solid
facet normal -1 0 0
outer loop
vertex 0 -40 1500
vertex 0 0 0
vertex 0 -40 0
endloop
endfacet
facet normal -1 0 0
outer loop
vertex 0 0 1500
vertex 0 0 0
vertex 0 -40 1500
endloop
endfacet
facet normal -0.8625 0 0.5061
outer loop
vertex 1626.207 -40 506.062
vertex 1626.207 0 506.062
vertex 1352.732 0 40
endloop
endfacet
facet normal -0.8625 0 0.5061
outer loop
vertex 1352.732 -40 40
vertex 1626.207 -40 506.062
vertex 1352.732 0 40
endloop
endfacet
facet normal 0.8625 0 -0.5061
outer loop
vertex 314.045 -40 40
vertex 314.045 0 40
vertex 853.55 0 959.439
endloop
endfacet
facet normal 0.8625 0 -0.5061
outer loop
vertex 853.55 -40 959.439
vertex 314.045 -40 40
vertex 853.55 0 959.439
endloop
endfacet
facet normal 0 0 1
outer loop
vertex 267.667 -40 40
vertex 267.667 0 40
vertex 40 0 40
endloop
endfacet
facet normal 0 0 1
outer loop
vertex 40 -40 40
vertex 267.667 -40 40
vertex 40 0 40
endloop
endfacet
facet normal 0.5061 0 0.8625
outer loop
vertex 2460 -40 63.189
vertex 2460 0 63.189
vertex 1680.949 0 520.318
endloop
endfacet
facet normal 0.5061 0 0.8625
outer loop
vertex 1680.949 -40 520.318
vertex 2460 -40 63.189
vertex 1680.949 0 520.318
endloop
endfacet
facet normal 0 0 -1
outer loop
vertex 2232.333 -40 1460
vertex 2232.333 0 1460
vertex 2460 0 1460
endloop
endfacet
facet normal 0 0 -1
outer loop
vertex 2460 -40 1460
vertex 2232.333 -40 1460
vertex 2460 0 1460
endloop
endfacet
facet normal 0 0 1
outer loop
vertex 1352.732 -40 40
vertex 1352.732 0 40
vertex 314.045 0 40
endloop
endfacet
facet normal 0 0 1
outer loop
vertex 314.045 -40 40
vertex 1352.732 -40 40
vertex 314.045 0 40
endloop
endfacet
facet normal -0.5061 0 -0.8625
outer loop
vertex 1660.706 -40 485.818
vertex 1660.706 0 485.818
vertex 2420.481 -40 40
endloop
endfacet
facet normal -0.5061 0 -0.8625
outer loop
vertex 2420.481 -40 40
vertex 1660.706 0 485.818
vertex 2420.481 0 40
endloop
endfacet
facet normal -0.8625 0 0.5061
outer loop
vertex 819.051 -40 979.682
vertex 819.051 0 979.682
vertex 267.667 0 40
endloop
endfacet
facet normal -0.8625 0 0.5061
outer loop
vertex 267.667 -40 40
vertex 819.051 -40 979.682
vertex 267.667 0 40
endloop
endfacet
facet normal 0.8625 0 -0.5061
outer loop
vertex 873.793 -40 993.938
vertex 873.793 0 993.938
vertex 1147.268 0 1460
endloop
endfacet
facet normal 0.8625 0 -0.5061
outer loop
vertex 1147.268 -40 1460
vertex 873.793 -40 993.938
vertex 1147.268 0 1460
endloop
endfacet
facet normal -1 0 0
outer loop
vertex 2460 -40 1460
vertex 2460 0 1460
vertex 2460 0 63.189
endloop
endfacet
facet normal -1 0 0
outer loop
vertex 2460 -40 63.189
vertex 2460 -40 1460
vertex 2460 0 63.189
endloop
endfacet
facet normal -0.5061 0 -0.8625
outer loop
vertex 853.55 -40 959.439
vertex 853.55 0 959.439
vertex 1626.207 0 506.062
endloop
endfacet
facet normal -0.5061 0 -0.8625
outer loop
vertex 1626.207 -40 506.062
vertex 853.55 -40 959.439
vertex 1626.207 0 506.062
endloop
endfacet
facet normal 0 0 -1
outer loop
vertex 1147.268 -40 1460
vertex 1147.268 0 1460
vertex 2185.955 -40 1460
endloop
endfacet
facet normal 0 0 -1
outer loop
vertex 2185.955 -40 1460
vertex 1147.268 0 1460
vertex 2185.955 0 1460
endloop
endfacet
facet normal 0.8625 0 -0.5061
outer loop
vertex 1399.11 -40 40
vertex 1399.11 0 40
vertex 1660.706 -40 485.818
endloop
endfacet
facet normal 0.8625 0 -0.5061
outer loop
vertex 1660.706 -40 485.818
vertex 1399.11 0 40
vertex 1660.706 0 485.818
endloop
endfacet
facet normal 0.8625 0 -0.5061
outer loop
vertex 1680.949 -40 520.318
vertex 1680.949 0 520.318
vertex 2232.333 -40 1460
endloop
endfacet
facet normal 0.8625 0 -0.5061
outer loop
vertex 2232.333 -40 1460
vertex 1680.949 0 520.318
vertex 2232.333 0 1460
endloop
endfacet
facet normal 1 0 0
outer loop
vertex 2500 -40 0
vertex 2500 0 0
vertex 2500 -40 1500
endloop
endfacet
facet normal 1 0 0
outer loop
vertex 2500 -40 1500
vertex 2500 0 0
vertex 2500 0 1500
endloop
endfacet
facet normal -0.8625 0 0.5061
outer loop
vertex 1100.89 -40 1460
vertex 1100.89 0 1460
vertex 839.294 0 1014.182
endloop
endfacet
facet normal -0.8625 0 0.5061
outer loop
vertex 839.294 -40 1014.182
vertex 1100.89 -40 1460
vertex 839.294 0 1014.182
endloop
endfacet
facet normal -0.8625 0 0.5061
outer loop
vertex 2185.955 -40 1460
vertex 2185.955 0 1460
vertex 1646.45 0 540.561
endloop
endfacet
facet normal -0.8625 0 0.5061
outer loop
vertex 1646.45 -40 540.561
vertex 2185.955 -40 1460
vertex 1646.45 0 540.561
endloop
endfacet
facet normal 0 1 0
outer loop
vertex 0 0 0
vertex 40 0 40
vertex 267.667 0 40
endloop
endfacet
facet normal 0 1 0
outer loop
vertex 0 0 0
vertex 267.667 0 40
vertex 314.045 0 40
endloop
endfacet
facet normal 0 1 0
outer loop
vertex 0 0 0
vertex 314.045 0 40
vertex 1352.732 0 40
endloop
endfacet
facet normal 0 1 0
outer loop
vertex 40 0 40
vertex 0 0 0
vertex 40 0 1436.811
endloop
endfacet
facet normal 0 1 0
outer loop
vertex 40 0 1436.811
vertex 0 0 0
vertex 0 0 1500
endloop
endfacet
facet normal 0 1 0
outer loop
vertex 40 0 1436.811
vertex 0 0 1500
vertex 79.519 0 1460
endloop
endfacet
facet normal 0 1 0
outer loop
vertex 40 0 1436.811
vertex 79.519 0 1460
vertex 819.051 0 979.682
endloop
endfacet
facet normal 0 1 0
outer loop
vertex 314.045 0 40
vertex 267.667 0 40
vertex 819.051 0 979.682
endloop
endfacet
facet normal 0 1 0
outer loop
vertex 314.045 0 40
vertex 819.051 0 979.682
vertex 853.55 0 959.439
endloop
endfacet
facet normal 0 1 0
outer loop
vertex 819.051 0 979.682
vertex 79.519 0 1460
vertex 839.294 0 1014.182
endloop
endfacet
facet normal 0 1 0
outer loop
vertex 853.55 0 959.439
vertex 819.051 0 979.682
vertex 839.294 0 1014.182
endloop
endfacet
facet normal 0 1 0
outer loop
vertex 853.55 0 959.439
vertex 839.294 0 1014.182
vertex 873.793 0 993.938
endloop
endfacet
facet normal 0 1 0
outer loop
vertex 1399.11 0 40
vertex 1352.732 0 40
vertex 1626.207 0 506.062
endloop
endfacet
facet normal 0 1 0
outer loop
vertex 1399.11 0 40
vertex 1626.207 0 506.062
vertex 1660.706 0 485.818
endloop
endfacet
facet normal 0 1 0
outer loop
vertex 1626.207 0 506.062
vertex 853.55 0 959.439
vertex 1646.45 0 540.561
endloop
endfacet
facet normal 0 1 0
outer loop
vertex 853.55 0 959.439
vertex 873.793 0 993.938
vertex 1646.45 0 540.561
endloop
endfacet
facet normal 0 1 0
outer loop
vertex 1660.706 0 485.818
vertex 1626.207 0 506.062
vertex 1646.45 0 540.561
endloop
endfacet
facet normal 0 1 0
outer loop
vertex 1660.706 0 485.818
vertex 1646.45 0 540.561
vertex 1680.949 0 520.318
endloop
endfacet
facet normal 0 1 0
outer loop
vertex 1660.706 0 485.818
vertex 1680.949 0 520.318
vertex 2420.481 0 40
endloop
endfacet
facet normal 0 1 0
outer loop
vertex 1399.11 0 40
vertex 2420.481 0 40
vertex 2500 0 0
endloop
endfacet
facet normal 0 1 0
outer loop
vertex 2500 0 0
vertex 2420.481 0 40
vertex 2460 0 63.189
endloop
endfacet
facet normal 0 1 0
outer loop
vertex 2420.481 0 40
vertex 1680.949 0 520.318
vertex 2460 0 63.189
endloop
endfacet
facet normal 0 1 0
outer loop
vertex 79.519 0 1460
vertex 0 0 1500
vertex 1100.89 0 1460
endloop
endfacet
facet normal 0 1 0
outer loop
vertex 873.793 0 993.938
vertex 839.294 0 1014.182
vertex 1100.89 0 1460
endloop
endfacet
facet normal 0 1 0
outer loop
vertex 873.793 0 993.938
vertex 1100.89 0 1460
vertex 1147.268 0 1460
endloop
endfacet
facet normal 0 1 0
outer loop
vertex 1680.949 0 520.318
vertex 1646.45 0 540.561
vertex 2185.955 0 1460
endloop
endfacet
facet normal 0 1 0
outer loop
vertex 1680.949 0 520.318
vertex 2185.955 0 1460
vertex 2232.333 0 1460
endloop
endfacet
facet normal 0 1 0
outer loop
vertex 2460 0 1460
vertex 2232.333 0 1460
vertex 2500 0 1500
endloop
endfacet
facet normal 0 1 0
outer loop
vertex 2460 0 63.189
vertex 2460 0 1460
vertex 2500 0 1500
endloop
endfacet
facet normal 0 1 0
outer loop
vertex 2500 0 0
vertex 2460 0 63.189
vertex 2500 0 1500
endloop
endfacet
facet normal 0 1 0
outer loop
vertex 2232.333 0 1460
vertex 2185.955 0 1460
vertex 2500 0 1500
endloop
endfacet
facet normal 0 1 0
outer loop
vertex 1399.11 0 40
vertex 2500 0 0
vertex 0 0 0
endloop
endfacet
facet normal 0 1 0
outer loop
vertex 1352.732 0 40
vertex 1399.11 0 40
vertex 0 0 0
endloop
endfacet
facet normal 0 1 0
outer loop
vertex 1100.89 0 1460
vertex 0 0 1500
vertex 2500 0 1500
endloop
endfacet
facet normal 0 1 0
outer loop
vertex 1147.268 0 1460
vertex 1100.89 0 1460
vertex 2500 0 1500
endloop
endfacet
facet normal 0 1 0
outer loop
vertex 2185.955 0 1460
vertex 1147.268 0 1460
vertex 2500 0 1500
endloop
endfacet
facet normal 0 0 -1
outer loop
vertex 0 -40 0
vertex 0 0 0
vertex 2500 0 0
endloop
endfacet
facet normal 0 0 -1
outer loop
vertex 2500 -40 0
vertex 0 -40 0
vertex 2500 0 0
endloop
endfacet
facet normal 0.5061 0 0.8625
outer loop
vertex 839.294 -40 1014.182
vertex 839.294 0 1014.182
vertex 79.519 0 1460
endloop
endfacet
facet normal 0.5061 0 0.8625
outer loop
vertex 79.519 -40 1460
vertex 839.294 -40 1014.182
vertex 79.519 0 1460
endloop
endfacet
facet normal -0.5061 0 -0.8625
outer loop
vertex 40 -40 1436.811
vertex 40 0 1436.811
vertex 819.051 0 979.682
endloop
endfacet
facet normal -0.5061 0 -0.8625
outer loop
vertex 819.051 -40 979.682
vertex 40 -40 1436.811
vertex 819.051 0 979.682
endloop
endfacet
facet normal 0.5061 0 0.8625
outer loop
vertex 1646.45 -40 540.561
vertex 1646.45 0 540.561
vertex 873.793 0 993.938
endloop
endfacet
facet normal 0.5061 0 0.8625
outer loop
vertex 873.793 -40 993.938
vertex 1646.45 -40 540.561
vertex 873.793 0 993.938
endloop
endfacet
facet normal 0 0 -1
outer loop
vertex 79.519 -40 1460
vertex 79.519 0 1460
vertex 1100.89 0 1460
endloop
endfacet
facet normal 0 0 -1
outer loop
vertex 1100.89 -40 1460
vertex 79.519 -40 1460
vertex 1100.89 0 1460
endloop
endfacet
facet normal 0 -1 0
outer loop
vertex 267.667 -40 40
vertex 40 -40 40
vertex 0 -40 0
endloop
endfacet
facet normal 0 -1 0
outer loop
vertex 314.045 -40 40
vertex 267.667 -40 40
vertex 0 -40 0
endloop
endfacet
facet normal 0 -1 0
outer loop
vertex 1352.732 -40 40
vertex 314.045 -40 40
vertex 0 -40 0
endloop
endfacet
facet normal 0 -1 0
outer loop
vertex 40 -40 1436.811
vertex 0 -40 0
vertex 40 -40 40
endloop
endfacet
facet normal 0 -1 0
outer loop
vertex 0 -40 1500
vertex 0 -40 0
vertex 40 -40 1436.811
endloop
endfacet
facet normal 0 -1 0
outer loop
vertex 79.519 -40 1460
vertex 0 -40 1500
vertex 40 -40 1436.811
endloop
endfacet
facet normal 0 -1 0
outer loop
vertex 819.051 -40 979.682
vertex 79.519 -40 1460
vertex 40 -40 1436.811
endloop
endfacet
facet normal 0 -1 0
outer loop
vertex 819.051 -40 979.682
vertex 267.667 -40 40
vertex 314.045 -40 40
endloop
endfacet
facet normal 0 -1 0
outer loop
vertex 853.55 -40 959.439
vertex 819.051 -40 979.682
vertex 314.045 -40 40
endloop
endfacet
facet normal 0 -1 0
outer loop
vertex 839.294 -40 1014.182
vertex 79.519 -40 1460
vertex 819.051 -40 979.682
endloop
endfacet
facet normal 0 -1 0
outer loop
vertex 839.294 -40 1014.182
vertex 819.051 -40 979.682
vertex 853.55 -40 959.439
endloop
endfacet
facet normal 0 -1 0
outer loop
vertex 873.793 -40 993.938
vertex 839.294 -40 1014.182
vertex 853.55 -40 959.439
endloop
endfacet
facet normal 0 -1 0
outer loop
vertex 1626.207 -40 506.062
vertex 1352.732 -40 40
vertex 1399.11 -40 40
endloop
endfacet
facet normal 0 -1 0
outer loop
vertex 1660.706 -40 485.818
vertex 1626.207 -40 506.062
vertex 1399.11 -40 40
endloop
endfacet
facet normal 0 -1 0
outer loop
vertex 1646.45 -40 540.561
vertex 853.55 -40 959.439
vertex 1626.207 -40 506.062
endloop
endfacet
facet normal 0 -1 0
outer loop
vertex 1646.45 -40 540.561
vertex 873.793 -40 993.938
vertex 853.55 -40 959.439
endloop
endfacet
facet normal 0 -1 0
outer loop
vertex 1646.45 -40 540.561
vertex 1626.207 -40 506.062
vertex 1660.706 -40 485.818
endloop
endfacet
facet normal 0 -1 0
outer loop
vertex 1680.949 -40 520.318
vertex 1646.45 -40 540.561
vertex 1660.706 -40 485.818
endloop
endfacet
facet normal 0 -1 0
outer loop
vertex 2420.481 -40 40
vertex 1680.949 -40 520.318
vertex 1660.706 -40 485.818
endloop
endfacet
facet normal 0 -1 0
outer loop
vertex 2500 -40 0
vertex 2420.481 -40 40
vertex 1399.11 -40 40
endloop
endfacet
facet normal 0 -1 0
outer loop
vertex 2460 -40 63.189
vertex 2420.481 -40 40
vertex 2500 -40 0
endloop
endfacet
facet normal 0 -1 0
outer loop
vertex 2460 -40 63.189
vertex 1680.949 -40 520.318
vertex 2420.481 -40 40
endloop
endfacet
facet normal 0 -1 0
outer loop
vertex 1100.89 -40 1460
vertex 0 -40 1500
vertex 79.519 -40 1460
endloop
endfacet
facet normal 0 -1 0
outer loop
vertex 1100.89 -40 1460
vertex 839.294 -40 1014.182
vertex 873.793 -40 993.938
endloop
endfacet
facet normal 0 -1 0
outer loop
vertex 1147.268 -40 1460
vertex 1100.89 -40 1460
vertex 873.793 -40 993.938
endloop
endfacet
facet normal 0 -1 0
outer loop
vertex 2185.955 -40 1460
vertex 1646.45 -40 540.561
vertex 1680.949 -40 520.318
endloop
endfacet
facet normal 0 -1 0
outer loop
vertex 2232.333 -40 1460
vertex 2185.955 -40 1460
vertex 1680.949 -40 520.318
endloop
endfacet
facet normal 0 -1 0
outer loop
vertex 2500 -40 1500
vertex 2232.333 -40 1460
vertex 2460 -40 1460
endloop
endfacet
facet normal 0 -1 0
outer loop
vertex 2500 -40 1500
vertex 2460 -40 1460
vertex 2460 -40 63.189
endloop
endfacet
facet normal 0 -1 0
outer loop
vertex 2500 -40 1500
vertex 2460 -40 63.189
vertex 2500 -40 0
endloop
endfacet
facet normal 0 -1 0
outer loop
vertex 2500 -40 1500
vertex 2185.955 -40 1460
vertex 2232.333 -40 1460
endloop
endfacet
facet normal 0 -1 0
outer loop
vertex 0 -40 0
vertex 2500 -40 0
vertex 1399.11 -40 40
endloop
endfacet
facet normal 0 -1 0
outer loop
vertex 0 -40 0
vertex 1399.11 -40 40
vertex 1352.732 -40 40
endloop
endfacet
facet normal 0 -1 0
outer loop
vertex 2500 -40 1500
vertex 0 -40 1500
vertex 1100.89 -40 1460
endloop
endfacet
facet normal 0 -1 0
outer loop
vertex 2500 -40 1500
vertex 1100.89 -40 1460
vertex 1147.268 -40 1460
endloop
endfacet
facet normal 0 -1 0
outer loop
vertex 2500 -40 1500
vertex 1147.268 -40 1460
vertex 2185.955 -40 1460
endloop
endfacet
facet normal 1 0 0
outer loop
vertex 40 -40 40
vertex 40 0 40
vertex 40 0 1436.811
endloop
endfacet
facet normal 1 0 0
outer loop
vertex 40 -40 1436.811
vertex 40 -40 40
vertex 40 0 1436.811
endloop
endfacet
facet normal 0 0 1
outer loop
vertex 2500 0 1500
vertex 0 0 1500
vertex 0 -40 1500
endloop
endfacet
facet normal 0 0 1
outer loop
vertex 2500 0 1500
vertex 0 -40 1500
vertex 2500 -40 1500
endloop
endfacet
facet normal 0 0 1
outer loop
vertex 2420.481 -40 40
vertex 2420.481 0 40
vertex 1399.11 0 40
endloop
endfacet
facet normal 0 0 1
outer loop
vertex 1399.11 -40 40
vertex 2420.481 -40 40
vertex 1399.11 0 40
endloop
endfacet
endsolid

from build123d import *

# Parameters (mm, degrees)
F0_W     = 2500
F0_H     = 1500
F1_DEPTH = 40


with BuildPart() as f1:
    # F0 (on Front) → F1 (new body)
    with BuildSketch(Plane.XZ):
        with Locations((1250, 750)):
            Rectangle(F0_W, F0_H)
        Polygon((40, 1436.8111485162), (40, 1460), (79.5190285851, 1460), (1100.8899553859, 1460), (1147.2676583536, 1460), (2185.9554821423, 1460), (2232.33318511, 1460), (2460, 1460), (2460, 63.1888514838), (2460, 40), (2420.4809714149, 40), (1399.1100446141, 40), (1352.7323416464, 40), (314.0445178577, 40), (267.66681489, 40), (40, 40), align=None, mode=Mode.SUBTRACT)
        Polygon((853.5499625474, 959.4388564429), (819.0506256329, 979.6822690125), (267.66681489, 40), (314.0445178577, 40), align=None)
        Polygon((79.5190285851, 1460), (40, 1460), (40, 1436.8111485162), (819.0506256329, 979.6822690125), (839.2940382026, 1014.181605927), align=None)
        Polygon((873.793375117, 993.9381933573), (839.2940382026, 1014.181605927), (819.0506256329, 979.6822690125), (853.5499625474, 959.4388564429), align=None)
        Polygon((1147.2676583536, 1460), (1100.8899553859, 1460), (839.2940382026, 1014.181605927), (873.793375117, 993.9381933573), align=None)
        Polygon((1646.4500374526, 540.5611435571), (873.793375117, 993.9381933573), (853.5499625474, 959.4388564429), (1626.206624883, 506.0618066427), align=None)
        Polygon((2232.33318511, 1460), (2185.9554821423, 1460), (1646.4500374526, 540.5611435571), (1680.9493743671, 520.3177309875), align=None)
        Polygon((2460, 63.1888514838), (1680.9493743671, 520.3177309875), (1660.7059617974, 485.818394073), (2420.4809714149, 40), (2460, 40), align=None)
        Polygon((1680.9493743671, 520.3177309875), (1646.4500374526, 540.5611435571), (1626.206624883, 506.0618066427), (1660.7059617974, 485.818394073), align=None)
        Polygon((1660.7059617974, 485.818394073), (1626.206624883, 506.0618066427), (1352.7323416464, 40), (1399.1100446141, 40), align=None)
    extrude(amount=F1_DEPTH)


solid = f1.part
